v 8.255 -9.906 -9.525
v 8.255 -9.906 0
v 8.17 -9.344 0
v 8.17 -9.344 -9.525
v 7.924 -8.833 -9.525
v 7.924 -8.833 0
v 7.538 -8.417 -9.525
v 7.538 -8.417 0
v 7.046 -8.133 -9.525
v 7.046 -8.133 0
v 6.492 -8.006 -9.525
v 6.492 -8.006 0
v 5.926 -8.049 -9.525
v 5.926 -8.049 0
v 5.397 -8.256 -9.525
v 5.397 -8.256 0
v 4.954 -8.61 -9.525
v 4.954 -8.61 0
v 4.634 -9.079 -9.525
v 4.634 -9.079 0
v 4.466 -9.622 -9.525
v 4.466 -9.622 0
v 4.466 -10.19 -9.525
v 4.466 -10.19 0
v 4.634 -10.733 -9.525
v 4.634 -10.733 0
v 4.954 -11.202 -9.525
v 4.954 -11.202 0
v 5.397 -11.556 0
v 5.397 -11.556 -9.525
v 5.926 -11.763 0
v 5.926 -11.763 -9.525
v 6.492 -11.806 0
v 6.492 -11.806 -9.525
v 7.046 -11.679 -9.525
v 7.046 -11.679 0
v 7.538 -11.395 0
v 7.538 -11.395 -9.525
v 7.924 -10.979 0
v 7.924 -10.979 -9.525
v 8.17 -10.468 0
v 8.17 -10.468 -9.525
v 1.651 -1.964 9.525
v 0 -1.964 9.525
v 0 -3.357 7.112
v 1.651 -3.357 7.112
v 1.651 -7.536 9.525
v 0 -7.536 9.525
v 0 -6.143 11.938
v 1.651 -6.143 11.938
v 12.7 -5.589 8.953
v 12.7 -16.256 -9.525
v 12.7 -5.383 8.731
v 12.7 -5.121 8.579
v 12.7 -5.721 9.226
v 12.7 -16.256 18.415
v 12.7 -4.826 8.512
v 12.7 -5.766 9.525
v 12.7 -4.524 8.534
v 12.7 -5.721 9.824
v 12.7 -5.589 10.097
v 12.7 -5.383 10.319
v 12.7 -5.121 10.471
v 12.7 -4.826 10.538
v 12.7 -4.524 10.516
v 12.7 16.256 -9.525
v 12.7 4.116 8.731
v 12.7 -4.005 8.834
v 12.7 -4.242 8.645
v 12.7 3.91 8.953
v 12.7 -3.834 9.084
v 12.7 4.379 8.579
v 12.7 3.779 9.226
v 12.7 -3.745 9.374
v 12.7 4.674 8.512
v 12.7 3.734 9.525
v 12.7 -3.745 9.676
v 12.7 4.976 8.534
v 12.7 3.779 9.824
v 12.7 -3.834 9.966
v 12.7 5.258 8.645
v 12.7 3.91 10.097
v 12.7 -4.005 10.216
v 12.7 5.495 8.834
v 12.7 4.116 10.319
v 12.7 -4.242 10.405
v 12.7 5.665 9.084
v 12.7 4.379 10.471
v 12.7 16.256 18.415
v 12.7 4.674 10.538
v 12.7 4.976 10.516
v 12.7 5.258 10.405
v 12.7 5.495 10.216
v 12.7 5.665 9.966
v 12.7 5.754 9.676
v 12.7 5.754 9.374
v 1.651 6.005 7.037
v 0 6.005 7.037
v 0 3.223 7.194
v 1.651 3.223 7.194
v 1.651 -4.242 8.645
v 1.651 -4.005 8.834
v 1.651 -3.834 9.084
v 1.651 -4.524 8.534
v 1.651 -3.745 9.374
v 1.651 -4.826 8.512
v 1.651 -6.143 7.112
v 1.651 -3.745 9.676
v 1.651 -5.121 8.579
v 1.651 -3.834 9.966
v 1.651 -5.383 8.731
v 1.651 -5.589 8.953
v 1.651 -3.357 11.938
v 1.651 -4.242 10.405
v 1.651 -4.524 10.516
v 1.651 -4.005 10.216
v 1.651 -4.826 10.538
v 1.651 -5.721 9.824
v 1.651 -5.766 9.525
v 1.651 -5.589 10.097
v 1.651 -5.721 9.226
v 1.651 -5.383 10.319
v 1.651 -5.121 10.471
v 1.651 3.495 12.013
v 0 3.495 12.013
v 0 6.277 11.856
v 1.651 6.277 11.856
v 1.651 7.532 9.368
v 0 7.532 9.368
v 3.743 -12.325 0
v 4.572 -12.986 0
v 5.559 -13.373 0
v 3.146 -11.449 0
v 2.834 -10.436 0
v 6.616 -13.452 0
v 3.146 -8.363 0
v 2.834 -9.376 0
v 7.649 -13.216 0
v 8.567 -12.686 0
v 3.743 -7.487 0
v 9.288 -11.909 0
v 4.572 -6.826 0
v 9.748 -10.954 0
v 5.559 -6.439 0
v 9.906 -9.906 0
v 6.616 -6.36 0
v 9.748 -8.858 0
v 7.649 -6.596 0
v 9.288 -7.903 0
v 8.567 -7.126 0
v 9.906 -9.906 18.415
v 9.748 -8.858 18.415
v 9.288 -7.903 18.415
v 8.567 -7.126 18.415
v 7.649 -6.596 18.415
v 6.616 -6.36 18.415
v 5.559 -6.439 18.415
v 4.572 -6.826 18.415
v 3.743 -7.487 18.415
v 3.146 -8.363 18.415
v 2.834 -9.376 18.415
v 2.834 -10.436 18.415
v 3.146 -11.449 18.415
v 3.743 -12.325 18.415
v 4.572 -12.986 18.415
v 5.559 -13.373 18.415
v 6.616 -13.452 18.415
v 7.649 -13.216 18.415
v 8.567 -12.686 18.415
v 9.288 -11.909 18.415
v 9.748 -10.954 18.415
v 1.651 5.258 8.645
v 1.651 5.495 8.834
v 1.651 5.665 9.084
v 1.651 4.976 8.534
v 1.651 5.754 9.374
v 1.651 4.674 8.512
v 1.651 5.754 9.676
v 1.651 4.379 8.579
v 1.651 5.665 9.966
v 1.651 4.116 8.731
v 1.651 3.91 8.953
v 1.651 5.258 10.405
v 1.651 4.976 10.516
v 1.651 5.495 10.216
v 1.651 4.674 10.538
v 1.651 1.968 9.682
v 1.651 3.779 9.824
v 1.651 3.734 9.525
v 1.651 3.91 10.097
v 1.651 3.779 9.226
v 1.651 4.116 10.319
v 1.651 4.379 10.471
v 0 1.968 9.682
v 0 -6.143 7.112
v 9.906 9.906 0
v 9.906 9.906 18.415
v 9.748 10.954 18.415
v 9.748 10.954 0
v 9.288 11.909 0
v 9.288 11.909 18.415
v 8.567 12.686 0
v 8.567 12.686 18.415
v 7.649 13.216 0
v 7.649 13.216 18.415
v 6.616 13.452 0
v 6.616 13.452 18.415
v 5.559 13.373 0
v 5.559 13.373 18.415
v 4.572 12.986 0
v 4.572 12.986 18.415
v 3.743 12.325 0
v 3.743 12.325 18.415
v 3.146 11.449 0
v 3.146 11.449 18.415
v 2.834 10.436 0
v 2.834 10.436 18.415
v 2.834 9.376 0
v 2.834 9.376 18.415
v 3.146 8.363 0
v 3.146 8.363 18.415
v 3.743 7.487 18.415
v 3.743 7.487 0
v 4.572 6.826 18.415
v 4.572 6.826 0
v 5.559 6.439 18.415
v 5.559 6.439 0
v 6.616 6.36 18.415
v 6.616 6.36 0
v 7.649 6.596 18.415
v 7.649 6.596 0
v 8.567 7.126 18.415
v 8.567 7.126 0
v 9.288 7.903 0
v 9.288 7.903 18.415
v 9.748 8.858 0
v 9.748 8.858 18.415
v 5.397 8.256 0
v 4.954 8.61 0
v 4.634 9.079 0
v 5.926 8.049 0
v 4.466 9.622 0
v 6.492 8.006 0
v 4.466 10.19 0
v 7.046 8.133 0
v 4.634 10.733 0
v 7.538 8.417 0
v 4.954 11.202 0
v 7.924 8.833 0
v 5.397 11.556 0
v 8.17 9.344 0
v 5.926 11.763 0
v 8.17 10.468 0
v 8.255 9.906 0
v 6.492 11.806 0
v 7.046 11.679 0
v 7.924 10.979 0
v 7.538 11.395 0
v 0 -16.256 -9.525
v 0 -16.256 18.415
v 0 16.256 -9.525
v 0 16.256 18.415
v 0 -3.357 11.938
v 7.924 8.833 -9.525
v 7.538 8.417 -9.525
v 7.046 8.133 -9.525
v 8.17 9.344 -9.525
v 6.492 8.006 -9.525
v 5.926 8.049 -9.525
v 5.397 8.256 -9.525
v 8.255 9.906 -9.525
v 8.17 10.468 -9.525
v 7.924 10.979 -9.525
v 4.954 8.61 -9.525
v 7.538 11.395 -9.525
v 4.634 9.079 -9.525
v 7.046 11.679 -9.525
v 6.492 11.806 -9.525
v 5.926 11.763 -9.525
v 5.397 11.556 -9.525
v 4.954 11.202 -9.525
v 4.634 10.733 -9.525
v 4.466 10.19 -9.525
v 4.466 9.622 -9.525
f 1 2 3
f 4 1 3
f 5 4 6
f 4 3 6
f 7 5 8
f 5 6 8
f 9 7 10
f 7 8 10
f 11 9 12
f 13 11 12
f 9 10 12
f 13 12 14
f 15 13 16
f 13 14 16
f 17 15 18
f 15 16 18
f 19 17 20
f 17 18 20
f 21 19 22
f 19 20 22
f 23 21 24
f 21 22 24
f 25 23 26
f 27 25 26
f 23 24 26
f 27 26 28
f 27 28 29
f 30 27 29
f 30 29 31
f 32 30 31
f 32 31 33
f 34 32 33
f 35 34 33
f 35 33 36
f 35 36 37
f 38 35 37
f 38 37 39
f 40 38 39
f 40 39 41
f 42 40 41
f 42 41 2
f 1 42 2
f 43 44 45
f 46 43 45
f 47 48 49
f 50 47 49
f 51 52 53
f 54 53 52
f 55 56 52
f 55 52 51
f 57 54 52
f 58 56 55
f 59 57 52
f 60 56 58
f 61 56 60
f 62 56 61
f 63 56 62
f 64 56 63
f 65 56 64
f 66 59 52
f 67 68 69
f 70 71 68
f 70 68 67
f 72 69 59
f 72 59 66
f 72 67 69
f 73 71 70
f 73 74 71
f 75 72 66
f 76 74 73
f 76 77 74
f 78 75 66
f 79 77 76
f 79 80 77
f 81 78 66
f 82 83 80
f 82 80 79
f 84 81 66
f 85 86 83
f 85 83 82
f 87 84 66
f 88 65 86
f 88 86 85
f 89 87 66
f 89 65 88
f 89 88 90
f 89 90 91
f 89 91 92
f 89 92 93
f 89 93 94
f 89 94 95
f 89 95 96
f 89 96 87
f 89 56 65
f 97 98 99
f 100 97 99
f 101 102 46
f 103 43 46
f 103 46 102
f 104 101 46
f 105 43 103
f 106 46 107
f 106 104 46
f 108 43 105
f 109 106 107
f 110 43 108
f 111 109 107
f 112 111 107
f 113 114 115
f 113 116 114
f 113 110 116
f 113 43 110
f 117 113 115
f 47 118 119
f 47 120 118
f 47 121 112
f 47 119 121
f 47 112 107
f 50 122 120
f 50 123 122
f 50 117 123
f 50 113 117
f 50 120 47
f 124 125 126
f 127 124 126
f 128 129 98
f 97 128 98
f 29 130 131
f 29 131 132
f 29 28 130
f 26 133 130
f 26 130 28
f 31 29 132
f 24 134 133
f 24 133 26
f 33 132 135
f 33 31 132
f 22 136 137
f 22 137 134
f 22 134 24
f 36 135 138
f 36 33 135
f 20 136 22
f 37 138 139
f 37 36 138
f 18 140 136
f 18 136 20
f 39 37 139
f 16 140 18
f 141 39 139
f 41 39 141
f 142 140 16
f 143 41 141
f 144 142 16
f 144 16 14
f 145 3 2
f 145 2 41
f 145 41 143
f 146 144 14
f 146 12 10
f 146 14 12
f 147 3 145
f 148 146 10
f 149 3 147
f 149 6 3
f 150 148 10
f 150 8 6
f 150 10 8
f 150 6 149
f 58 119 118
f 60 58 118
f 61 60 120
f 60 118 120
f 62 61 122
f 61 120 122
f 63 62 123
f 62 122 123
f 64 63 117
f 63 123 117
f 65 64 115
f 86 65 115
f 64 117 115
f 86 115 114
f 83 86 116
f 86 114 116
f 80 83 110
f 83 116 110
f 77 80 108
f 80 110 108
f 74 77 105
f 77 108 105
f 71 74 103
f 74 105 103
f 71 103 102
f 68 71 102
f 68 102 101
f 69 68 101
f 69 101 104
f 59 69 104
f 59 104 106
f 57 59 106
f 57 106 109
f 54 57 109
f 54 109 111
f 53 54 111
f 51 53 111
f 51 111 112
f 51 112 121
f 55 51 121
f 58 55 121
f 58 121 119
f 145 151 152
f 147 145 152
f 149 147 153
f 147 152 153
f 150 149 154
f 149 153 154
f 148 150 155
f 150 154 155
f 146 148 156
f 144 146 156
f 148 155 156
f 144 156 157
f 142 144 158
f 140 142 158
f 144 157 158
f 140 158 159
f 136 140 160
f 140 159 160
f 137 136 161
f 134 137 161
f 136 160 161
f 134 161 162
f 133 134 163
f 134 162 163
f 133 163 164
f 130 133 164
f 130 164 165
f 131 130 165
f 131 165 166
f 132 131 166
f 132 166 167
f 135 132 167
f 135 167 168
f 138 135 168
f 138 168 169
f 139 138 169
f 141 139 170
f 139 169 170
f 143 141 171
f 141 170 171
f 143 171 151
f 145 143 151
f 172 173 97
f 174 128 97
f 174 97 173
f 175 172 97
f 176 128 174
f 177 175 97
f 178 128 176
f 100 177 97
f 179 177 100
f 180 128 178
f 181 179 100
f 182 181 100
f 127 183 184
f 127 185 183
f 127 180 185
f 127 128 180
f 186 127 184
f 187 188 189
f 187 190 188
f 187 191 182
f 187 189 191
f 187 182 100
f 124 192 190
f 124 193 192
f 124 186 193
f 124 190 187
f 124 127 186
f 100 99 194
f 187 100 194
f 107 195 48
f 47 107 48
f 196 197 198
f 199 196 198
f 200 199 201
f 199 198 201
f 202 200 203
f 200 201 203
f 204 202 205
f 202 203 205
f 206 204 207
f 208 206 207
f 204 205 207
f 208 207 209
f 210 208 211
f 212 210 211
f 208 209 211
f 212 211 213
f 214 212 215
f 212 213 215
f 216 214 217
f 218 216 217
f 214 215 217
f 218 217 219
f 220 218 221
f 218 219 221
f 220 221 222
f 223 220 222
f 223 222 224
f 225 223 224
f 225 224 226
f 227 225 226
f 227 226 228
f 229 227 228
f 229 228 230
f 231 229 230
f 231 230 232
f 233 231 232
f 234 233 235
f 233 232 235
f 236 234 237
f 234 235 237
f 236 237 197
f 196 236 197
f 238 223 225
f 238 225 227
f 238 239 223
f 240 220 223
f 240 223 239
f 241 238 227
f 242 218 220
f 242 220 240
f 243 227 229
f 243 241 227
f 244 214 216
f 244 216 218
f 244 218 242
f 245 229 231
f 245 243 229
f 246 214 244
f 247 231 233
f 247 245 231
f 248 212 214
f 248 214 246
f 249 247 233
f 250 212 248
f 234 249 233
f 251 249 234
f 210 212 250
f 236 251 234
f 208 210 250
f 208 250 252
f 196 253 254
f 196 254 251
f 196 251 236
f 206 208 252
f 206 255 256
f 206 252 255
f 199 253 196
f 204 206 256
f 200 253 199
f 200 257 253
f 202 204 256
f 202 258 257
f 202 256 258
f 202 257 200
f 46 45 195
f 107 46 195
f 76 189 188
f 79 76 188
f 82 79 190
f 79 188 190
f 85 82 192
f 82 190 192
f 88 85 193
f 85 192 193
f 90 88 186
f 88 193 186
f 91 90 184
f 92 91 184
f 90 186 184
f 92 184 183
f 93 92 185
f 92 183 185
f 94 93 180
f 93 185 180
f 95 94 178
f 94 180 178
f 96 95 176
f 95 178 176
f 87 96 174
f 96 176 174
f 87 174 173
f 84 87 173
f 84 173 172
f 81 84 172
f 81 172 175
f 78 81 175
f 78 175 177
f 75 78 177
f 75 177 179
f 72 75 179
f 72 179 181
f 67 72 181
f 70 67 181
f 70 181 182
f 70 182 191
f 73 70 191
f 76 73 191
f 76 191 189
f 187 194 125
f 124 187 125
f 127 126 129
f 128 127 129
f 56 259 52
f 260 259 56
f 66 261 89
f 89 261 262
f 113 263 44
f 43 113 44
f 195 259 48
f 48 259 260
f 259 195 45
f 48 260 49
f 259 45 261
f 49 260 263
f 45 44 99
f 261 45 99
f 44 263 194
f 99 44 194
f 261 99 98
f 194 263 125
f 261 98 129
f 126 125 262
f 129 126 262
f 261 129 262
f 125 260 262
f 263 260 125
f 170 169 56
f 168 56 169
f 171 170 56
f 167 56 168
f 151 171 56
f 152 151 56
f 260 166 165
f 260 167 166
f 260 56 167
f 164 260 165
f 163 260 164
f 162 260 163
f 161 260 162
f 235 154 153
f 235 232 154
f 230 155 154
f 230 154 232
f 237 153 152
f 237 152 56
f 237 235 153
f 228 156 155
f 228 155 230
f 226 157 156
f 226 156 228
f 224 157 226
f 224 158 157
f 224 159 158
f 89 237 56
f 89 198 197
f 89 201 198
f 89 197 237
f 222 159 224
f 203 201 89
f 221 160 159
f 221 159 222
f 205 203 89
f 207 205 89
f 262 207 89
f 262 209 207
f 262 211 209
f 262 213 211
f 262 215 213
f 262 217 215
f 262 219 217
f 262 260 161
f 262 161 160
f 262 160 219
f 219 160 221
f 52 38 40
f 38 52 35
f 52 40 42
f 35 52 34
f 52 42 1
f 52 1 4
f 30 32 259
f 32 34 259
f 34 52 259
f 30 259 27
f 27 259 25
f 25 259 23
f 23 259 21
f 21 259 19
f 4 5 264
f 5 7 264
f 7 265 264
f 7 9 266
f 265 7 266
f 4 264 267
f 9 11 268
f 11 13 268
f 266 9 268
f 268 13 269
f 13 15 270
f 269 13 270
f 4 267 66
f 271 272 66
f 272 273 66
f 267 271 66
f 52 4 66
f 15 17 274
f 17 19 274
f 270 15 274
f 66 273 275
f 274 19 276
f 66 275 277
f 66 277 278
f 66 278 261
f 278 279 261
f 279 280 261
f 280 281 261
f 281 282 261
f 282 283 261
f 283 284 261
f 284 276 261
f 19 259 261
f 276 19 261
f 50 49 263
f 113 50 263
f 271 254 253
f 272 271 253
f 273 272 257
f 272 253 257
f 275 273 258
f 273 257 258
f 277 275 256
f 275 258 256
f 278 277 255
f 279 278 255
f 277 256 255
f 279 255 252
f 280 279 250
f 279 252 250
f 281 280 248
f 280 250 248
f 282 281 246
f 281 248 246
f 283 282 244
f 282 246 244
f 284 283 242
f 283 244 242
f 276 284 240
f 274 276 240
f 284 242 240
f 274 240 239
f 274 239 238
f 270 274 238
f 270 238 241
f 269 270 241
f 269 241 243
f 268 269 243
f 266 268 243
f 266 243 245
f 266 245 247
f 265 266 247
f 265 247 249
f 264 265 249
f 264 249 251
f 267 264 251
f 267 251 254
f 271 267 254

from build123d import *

# Parameters (mm, degrees)
F0_W     = 32.512
F0_H     = 27.94
F1_DEPTH = 12.7
F2_R     = 1.016
F3_DEPTH = 12.701
F5_DEPTH = 1.651
F6_R     = 1.905
F7_DEPTH = 27.941
F8_R     = 3.556
F9_DEPTH = 18.415


with BuildPart() as f1:
    # F0 (on Right) → F1 (new body)
    with BuildSketch(Plane.YZ):
        with Locations((0, 4.445)):
            Rectangle(F0_W, F0_H)
    extrude(amount=F1_DEPTH)

    # F2 (on face) → F3 (cut, through all)
    with BuildSketch(Plane(origin=(0, 0, 0), x_dir=(0, -1, 0), z_dir=(-1, 0, 0))):
        with Locations((4.7498, 9.525)):
            Circle(F2_R)
        with Locations((-4.7498, 9.525)):
            Circle(F2_R)
    extrude(amount=-F3_DEPTH, mode=Mode.SUBTRACT)

    # F4 (on face) → F5 (cut)
    with BuildSketch(Plane(origin=(0, 0, 0), x_dir=(0, -1, 0), z_dir=(-1, 0, 0))):
        Polygon((-1.96794, 9.682093), (-3.494916, 12.012708), (-6.276777, 11.855615), (-7.53166, 9.367907), (-6.004684, 7.037292), (-3.222823, 7.194385), align=None)
        Polygon((6.142946, 11.938), (3.356654, 11.938), (1.963508, 9.525), (3.356654, 7.112), (6.142946, 7.112), (7.536092, 9.525), align=None)
    extrude(amount=-F5_DEPTH, mode=Mode.SUBTRACT)

    # F6 (on face) → F7 (cut, through all)
    with BuildSketch(Plane.XY.offset(18.415)):
        with Locations((6.35, -9.906)):
            Circle(F6_R)
        with Locations((6.35, 9.906)):
            Circle(F6_R)
    extrude(amount=-F7_DEPTH, mode=Mode.SUBTRACT)

    # F8 (on face) → F9 (cut)
    with BuildSketch(Plane.XY.offset(18.415)):
        with Locations((6.35, 9.906)):
            Circle(F8_R)
        with Locations((6.35, -9.906)):
            Circle(F8_R)
    extrude(amount=-F9_DEPTH, mode=Mode.SUBTRACT)


solid = f1.part
